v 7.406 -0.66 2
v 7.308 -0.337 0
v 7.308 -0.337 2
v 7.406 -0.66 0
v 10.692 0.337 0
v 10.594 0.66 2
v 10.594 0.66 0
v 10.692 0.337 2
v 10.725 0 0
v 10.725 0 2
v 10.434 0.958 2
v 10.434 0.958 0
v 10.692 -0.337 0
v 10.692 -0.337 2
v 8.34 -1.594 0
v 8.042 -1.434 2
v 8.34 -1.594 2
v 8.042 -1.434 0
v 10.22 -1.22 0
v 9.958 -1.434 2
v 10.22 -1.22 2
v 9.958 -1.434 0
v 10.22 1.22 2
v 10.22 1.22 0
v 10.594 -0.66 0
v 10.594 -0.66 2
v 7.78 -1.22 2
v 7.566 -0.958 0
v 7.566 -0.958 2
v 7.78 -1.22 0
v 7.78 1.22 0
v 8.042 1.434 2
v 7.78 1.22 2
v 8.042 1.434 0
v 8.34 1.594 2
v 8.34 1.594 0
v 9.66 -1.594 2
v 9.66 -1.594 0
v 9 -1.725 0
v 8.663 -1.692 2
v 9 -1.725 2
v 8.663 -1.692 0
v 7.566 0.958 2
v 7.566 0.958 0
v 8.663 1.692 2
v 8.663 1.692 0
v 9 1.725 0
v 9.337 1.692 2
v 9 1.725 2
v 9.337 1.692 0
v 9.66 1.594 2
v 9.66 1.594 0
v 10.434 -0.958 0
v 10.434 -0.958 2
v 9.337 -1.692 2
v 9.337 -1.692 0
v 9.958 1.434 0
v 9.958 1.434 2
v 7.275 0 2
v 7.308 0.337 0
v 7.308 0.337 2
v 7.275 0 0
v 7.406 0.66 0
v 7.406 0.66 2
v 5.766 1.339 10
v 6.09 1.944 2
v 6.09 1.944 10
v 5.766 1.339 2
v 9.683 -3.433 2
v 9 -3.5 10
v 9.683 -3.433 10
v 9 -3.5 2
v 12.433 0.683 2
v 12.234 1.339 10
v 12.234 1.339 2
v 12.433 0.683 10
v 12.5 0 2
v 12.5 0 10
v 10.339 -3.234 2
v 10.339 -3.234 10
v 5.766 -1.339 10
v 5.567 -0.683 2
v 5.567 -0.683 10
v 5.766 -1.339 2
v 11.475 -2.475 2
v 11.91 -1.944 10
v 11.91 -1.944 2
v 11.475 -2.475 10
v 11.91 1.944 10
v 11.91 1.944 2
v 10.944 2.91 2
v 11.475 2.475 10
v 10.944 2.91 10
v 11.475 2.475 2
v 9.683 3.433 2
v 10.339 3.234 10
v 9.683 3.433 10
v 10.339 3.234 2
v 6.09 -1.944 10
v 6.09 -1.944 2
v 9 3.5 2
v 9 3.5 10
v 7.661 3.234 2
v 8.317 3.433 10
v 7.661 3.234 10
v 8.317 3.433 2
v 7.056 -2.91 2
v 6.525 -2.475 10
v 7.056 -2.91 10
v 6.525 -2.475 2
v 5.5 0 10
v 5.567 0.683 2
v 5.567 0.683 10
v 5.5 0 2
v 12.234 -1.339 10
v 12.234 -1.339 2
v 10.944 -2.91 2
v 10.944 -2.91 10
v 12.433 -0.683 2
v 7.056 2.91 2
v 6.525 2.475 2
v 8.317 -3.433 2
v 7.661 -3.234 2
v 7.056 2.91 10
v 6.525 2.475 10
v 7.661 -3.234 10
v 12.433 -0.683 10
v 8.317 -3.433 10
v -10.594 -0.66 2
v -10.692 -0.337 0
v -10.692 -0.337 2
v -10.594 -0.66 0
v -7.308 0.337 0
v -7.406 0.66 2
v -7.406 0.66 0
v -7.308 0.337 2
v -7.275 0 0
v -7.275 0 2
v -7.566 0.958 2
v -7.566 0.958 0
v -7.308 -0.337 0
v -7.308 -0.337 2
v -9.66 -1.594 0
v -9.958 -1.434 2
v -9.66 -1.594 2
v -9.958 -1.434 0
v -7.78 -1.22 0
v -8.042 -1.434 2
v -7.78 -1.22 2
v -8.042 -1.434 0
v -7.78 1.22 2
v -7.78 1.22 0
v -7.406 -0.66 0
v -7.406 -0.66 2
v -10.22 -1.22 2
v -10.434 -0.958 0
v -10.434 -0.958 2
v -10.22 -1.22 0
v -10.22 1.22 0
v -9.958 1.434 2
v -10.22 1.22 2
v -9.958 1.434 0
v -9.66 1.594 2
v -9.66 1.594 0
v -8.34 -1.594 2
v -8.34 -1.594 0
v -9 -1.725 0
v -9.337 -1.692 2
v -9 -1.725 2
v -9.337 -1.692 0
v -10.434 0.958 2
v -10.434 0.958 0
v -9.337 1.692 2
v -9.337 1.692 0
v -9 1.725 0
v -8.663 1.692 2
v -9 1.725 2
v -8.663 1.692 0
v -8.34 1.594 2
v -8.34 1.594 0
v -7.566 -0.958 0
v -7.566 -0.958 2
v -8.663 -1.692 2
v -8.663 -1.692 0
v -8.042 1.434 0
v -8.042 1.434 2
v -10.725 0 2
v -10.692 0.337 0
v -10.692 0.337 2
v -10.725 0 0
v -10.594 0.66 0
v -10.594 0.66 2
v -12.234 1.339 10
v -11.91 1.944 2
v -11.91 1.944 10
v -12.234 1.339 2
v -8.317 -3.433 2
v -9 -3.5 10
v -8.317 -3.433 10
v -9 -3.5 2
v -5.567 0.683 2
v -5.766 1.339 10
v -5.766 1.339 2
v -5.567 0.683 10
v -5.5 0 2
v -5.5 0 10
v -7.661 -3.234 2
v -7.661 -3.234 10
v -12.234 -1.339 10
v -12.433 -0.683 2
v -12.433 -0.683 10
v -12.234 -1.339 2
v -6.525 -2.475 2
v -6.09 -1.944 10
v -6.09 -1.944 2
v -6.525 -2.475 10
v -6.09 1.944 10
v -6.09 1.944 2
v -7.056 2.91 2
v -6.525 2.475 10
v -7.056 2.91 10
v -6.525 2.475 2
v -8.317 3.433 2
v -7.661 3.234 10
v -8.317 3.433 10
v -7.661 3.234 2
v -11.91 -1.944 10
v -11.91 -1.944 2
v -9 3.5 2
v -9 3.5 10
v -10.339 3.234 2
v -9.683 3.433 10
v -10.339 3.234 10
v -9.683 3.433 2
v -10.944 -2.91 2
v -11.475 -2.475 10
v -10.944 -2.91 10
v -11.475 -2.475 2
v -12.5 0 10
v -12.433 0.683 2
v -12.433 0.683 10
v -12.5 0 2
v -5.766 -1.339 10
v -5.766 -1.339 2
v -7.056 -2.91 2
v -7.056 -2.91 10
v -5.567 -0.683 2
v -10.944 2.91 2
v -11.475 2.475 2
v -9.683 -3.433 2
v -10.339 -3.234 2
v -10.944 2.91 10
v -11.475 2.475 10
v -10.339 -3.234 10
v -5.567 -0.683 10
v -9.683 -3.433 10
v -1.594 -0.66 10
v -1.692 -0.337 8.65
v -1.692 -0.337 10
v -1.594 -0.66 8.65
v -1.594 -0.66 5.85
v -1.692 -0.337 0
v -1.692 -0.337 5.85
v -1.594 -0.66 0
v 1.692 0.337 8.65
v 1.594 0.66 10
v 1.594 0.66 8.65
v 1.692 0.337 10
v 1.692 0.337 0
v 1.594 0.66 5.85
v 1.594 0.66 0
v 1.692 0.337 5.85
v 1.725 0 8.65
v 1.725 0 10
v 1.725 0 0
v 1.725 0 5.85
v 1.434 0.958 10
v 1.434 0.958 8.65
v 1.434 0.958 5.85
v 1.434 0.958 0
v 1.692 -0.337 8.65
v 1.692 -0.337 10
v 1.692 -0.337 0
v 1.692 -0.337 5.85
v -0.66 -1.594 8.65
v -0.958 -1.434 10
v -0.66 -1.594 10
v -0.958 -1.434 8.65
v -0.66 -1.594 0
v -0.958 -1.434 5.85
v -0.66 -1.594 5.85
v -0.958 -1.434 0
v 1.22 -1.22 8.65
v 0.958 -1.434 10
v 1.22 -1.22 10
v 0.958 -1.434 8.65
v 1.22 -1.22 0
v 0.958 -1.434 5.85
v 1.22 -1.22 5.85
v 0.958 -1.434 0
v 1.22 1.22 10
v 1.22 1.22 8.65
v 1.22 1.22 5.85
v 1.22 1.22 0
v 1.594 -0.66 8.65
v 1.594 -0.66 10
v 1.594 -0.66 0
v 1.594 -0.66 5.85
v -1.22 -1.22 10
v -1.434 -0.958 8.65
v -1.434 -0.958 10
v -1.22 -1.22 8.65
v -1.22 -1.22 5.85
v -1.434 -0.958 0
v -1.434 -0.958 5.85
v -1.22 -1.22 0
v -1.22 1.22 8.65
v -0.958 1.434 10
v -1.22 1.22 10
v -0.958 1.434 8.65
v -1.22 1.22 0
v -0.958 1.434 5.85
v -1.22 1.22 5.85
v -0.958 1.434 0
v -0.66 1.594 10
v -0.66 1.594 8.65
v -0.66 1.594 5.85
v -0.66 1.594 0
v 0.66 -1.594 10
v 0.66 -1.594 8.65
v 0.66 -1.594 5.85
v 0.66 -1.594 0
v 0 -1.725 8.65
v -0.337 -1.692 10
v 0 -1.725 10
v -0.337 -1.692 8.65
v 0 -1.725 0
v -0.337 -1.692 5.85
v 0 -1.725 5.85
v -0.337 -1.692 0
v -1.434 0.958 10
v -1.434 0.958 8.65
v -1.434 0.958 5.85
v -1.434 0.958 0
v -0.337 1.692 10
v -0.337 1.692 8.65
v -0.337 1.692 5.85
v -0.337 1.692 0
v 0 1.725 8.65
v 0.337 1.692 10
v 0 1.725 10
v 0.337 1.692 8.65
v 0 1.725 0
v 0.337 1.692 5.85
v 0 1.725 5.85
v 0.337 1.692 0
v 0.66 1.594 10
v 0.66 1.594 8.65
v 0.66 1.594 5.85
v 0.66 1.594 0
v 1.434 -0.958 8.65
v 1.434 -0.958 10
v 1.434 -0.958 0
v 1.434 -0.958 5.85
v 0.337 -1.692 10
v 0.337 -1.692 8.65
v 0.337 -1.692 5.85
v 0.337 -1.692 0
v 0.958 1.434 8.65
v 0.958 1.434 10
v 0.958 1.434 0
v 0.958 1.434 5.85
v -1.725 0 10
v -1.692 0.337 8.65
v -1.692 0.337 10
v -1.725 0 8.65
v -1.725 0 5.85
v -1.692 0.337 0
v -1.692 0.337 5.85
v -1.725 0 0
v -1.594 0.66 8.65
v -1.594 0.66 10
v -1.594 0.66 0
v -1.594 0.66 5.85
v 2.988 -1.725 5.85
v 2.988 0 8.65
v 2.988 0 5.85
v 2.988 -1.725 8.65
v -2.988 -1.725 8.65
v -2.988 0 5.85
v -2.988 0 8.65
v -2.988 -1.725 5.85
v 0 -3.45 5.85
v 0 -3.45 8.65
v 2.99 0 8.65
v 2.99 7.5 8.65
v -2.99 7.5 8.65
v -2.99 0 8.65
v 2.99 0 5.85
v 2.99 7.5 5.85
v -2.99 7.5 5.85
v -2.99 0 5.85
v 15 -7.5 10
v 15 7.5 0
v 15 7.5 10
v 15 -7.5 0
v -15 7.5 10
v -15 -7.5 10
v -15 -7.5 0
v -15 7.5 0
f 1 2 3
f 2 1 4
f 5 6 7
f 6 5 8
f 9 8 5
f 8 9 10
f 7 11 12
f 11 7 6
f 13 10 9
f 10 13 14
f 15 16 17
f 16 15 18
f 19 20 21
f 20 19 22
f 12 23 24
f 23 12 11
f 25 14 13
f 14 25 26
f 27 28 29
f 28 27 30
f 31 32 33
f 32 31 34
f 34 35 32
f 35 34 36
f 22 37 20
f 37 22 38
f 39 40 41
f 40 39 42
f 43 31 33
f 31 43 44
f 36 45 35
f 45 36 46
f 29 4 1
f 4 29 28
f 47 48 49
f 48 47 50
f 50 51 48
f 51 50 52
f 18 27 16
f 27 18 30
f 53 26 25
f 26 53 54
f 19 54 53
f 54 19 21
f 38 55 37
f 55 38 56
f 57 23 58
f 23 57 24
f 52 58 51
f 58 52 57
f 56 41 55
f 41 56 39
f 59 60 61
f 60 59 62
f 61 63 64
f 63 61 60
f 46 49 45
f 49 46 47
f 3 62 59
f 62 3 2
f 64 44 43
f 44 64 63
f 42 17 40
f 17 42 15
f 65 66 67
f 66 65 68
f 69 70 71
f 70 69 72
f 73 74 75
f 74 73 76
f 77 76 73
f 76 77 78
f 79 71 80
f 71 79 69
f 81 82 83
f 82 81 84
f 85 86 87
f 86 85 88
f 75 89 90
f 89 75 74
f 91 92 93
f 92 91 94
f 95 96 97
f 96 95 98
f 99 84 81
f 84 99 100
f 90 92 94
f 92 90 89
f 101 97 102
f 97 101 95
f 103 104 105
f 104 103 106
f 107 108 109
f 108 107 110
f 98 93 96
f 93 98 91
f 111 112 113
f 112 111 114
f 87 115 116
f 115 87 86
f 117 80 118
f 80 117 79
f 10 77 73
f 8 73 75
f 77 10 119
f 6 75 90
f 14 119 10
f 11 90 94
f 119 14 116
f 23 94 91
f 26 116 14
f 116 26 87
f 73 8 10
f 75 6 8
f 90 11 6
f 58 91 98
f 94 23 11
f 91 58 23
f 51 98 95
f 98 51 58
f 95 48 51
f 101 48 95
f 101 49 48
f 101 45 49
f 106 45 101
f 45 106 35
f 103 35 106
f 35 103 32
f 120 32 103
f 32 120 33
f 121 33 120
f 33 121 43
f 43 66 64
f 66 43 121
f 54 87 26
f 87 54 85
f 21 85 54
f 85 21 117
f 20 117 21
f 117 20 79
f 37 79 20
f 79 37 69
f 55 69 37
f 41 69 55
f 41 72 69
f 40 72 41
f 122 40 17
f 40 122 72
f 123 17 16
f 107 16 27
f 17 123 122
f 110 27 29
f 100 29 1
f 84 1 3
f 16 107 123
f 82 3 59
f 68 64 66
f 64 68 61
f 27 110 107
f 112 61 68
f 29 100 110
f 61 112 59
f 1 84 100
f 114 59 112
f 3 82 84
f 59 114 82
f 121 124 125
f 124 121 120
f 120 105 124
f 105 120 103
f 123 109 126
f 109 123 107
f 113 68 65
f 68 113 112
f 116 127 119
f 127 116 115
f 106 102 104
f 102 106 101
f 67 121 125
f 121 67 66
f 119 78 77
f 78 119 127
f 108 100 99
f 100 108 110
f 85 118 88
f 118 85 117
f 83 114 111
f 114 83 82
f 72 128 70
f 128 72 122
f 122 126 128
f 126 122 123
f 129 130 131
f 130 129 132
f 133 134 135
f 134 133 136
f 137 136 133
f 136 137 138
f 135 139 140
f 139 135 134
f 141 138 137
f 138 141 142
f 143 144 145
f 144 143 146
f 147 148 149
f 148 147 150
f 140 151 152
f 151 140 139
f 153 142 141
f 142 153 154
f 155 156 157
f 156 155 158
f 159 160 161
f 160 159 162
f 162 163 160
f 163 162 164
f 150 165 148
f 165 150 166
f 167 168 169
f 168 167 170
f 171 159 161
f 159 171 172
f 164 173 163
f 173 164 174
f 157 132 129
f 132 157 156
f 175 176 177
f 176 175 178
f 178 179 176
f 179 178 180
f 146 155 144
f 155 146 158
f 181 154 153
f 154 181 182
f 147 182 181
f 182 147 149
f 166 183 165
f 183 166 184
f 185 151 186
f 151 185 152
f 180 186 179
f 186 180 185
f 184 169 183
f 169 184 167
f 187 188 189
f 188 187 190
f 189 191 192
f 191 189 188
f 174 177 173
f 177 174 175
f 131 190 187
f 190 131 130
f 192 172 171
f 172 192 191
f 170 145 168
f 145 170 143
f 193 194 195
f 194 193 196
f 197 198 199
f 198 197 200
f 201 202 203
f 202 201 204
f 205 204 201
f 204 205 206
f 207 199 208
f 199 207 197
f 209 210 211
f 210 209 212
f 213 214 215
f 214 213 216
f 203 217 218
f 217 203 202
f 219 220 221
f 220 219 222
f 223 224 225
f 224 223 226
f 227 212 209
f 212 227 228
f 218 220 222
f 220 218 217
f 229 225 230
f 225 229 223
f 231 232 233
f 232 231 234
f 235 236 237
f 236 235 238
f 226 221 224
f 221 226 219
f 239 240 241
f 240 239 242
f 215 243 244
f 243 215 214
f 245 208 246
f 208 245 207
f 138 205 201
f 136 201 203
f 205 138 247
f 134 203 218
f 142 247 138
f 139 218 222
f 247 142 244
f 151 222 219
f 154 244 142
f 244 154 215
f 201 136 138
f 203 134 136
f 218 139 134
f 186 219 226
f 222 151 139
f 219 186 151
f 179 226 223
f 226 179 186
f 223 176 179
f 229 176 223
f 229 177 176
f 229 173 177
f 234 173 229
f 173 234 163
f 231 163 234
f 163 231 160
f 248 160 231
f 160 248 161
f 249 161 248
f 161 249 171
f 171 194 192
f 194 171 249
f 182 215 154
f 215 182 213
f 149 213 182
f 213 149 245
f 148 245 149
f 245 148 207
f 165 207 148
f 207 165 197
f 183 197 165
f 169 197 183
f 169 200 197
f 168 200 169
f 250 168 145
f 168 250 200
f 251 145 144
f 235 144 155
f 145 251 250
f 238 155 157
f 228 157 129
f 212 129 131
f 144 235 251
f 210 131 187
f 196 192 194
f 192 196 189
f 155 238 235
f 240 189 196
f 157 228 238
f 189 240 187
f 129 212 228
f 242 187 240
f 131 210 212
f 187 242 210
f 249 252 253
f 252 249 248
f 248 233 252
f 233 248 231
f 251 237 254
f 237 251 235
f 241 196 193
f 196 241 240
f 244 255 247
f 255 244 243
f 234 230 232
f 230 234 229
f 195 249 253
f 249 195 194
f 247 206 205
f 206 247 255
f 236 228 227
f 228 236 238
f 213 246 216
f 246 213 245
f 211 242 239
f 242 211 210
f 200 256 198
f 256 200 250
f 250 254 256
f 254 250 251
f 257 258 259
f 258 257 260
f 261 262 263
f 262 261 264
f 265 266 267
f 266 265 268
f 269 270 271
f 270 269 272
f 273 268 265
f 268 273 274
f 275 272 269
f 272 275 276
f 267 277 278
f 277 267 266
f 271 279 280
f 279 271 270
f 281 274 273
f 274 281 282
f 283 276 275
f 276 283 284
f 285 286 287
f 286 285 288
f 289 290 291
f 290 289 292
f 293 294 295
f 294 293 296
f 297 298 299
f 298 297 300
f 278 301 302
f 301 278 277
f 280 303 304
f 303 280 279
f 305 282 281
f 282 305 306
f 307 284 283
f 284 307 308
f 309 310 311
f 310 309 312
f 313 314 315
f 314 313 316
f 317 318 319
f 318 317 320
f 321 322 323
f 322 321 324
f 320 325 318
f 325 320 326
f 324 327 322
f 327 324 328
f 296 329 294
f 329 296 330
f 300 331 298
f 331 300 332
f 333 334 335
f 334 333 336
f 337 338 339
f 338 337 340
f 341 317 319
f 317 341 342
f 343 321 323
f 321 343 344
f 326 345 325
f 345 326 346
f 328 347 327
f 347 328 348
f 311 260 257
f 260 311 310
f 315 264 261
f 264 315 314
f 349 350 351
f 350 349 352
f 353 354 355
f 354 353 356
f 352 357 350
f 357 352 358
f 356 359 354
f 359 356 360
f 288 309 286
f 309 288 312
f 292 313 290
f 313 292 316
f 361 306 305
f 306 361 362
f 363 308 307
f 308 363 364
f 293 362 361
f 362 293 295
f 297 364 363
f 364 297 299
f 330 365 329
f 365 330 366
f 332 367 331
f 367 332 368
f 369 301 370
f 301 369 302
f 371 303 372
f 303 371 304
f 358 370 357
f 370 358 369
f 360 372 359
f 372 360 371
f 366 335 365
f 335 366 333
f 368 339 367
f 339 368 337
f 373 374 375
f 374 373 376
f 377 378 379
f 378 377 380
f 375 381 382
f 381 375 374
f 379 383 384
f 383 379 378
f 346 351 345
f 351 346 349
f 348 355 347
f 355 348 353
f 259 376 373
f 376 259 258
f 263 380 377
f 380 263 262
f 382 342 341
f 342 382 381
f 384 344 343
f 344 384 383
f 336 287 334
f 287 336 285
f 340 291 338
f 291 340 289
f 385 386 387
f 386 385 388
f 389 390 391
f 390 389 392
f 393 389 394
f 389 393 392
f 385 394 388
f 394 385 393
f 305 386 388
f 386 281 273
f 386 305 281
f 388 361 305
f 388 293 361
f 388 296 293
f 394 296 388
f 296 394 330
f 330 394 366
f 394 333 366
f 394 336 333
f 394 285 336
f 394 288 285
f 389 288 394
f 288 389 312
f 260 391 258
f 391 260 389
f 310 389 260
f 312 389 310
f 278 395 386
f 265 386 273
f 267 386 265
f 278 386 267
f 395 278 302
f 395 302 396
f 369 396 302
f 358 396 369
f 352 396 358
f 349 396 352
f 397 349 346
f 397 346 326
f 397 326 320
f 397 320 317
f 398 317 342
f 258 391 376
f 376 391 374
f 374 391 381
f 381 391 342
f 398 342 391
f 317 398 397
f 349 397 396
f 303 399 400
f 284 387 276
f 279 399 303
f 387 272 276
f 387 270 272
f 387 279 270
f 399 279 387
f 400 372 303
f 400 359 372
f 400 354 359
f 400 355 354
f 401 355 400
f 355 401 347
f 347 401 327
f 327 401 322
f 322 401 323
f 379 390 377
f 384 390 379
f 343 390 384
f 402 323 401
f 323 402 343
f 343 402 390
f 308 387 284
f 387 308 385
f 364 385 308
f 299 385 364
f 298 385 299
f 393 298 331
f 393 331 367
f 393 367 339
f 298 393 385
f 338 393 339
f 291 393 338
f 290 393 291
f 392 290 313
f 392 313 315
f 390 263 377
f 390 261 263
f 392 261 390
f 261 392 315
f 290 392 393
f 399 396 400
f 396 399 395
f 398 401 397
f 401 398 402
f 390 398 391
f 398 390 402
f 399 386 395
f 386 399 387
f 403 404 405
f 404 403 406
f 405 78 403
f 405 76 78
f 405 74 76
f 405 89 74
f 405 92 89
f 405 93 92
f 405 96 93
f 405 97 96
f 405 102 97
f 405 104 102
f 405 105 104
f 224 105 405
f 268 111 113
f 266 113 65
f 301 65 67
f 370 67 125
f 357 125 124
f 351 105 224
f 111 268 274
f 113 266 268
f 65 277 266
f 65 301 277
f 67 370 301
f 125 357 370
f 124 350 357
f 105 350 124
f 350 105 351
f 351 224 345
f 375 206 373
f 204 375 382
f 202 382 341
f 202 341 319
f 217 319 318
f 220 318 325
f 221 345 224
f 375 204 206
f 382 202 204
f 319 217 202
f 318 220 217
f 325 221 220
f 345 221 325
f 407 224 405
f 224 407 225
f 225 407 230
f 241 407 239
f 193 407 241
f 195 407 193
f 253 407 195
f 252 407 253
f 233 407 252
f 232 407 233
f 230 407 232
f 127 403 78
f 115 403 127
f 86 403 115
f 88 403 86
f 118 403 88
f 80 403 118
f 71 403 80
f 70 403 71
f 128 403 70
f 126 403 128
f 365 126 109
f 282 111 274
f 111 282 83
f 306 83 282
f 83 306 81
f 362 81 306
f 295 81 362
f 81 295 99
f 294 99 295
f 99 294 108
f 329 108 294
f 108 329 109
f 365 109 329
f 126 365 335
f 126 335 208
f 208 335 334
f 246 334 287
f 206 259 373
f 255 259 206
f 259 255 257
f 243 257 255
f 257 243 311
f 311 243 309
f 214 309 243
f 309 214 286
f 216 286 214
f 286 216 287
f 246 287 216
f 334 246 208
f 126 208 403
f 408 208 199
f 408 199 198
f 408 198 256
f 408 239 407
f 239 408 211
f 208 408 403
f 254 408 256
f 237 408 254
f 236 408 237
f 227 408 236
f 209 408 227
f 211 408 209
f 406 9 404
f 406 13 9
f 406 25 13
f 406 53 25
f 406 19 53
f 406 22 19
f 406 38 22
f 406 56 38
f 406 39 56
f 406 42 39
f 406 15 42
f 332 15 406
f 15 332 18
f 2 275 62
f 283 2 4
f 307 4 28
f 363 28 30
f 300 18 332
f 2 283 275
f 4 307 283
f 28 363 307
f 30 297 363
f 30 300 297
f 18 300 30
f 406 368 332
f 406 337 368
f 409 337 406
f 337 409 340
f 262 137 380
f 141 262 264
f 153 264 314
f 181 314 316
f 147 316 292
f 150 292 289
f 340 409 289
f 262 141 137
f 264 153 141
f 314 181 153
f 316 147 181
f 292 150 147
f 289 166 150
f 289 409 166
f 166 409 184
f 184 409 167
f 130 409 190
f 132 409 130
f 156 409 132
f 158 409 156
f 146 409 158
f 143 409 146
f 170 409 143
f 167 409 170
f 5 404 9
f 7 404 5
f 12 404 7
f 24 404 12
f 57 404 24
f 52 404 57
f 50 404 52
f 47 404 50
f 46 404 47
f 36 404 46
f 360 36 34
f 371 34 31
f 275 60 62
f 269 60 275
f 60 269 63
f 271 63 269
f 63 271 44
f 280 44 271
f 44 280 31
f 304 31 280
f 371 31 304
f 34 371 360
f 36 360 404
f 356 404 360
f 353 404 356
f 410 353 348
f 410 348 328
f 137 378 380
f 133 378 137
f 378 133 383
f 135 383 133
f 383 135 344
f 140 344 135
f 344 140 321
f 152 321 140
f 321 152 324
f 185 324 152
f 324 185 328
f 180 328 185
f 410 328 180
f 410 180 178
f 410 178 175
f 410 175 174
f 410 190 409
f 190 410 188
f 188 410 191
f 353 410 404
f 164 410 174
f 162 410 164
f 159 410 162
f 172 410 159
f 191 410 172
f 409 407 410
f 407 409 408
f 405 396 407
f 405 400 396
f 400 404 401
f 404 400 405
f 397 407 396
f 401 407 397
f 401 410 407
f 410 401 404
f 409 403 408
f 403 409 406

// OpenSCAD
// file: configuration.scad
// Increase this if your slicer or printer make holes too tight.
extra_radius = 0.1;

// OD = outside diameter, corner to corner.
m3_nut_od = 6.1;
m3_nut_radius = m3_nut_od/2 + 0.2 + extra_radius;
m3_nut_thickness = 2.4 + extra_radius;
m3_washer_radius = 3.5 + extra_radius;

// Major diameter of metric 3mm thread.
m3_major = 2.85;
m3_radius = m3_major/2 + extra_radius;
m3_wide_radius = m3_major/2 + extra_radius + 0.2;

// OD = outside diameter, corner to corner.
m4_nut_od = 7.1;
m4_nut_radius = m4_nut_od/2 + 0.2 + extra_radius;
m4_thickness = 3.82 + extra_radius;
m4_washer_radius = 4.5 + extra_radius;

// Major diameter of metric 3mm thread.
m4_major = 3.85;
m4_radius = m4_major/2 + extra_radius;
m4_wide_radius = m4_major/2 + extra_radius + 0.2;

// NEMA17 stepper motors.
motor_shaft_diameter = 5;
motor_shaft_radius = motor_shaft_diameter/2 + extra_radius;

// Frame brackets. M3x8mm screws work best with 3.6 mm brackets.
thickness = 3.6;

// OpenBeam or Misumi. Currently only 15x15 mm, but there is a plan
// to make models more parametric and allow 20x20 mm in the future.
extrusion = 15;

// Placement for the NEMA17 stepper motors.
motor_offset = 44;
motor_length = 47;
// main file
include <configuration.scad>;

$fn = 32;

extra = .1;

module extrusion_cutout(h, extra) {
  difference() {
    cube([extrusion+extra, extrusion+extra, h], center=true);
    for (a = [0:90:359]) rotate([0, 0, a]) {
      translate([extrusion/2, 0, 0])
        cube([6, 2.5, h+1], center=true);
    }
  }
}

module screw_socket() {
  cylinder(r=m3_wide_radius, h=8, center=true);
  translate([0, 0, 3]) cylinder(r=3.5, h=9);
}

module bed_mount() {
  height=10;
  width=15;
  length=30;

  difference() {
    union() {
      translate([0, 0, height/2])
        cube([length, width, height], center=true);
    }
    union() {
      for(a = [1, -1]) {
        translate([a*9, 0, -1])
          screw_socket();
      }

      translate([0, 0, height/2])
        cylinder(r=m3_wide_radius, h=height+1, center=true);

      translate([0, 0, m3_nut_thickness/2 + 6]) rotate([0, 0, 90])
        cylinder(r=m3_nut_radius + extra, h=2.5 + 3 * extra, center=true, $fn=6);
      translate([0, 5, m3_nut_thickness/2 + 6])
		    cube([5.5 + 4.8 * extra, 10, 2.5 + 3 * extra], center = true);
    }
  }
}


bed_mount();
//translate([0, 0, -15/2]) rotate([0, 90, 0])
//  % extrusion_cutout(100, 0);
